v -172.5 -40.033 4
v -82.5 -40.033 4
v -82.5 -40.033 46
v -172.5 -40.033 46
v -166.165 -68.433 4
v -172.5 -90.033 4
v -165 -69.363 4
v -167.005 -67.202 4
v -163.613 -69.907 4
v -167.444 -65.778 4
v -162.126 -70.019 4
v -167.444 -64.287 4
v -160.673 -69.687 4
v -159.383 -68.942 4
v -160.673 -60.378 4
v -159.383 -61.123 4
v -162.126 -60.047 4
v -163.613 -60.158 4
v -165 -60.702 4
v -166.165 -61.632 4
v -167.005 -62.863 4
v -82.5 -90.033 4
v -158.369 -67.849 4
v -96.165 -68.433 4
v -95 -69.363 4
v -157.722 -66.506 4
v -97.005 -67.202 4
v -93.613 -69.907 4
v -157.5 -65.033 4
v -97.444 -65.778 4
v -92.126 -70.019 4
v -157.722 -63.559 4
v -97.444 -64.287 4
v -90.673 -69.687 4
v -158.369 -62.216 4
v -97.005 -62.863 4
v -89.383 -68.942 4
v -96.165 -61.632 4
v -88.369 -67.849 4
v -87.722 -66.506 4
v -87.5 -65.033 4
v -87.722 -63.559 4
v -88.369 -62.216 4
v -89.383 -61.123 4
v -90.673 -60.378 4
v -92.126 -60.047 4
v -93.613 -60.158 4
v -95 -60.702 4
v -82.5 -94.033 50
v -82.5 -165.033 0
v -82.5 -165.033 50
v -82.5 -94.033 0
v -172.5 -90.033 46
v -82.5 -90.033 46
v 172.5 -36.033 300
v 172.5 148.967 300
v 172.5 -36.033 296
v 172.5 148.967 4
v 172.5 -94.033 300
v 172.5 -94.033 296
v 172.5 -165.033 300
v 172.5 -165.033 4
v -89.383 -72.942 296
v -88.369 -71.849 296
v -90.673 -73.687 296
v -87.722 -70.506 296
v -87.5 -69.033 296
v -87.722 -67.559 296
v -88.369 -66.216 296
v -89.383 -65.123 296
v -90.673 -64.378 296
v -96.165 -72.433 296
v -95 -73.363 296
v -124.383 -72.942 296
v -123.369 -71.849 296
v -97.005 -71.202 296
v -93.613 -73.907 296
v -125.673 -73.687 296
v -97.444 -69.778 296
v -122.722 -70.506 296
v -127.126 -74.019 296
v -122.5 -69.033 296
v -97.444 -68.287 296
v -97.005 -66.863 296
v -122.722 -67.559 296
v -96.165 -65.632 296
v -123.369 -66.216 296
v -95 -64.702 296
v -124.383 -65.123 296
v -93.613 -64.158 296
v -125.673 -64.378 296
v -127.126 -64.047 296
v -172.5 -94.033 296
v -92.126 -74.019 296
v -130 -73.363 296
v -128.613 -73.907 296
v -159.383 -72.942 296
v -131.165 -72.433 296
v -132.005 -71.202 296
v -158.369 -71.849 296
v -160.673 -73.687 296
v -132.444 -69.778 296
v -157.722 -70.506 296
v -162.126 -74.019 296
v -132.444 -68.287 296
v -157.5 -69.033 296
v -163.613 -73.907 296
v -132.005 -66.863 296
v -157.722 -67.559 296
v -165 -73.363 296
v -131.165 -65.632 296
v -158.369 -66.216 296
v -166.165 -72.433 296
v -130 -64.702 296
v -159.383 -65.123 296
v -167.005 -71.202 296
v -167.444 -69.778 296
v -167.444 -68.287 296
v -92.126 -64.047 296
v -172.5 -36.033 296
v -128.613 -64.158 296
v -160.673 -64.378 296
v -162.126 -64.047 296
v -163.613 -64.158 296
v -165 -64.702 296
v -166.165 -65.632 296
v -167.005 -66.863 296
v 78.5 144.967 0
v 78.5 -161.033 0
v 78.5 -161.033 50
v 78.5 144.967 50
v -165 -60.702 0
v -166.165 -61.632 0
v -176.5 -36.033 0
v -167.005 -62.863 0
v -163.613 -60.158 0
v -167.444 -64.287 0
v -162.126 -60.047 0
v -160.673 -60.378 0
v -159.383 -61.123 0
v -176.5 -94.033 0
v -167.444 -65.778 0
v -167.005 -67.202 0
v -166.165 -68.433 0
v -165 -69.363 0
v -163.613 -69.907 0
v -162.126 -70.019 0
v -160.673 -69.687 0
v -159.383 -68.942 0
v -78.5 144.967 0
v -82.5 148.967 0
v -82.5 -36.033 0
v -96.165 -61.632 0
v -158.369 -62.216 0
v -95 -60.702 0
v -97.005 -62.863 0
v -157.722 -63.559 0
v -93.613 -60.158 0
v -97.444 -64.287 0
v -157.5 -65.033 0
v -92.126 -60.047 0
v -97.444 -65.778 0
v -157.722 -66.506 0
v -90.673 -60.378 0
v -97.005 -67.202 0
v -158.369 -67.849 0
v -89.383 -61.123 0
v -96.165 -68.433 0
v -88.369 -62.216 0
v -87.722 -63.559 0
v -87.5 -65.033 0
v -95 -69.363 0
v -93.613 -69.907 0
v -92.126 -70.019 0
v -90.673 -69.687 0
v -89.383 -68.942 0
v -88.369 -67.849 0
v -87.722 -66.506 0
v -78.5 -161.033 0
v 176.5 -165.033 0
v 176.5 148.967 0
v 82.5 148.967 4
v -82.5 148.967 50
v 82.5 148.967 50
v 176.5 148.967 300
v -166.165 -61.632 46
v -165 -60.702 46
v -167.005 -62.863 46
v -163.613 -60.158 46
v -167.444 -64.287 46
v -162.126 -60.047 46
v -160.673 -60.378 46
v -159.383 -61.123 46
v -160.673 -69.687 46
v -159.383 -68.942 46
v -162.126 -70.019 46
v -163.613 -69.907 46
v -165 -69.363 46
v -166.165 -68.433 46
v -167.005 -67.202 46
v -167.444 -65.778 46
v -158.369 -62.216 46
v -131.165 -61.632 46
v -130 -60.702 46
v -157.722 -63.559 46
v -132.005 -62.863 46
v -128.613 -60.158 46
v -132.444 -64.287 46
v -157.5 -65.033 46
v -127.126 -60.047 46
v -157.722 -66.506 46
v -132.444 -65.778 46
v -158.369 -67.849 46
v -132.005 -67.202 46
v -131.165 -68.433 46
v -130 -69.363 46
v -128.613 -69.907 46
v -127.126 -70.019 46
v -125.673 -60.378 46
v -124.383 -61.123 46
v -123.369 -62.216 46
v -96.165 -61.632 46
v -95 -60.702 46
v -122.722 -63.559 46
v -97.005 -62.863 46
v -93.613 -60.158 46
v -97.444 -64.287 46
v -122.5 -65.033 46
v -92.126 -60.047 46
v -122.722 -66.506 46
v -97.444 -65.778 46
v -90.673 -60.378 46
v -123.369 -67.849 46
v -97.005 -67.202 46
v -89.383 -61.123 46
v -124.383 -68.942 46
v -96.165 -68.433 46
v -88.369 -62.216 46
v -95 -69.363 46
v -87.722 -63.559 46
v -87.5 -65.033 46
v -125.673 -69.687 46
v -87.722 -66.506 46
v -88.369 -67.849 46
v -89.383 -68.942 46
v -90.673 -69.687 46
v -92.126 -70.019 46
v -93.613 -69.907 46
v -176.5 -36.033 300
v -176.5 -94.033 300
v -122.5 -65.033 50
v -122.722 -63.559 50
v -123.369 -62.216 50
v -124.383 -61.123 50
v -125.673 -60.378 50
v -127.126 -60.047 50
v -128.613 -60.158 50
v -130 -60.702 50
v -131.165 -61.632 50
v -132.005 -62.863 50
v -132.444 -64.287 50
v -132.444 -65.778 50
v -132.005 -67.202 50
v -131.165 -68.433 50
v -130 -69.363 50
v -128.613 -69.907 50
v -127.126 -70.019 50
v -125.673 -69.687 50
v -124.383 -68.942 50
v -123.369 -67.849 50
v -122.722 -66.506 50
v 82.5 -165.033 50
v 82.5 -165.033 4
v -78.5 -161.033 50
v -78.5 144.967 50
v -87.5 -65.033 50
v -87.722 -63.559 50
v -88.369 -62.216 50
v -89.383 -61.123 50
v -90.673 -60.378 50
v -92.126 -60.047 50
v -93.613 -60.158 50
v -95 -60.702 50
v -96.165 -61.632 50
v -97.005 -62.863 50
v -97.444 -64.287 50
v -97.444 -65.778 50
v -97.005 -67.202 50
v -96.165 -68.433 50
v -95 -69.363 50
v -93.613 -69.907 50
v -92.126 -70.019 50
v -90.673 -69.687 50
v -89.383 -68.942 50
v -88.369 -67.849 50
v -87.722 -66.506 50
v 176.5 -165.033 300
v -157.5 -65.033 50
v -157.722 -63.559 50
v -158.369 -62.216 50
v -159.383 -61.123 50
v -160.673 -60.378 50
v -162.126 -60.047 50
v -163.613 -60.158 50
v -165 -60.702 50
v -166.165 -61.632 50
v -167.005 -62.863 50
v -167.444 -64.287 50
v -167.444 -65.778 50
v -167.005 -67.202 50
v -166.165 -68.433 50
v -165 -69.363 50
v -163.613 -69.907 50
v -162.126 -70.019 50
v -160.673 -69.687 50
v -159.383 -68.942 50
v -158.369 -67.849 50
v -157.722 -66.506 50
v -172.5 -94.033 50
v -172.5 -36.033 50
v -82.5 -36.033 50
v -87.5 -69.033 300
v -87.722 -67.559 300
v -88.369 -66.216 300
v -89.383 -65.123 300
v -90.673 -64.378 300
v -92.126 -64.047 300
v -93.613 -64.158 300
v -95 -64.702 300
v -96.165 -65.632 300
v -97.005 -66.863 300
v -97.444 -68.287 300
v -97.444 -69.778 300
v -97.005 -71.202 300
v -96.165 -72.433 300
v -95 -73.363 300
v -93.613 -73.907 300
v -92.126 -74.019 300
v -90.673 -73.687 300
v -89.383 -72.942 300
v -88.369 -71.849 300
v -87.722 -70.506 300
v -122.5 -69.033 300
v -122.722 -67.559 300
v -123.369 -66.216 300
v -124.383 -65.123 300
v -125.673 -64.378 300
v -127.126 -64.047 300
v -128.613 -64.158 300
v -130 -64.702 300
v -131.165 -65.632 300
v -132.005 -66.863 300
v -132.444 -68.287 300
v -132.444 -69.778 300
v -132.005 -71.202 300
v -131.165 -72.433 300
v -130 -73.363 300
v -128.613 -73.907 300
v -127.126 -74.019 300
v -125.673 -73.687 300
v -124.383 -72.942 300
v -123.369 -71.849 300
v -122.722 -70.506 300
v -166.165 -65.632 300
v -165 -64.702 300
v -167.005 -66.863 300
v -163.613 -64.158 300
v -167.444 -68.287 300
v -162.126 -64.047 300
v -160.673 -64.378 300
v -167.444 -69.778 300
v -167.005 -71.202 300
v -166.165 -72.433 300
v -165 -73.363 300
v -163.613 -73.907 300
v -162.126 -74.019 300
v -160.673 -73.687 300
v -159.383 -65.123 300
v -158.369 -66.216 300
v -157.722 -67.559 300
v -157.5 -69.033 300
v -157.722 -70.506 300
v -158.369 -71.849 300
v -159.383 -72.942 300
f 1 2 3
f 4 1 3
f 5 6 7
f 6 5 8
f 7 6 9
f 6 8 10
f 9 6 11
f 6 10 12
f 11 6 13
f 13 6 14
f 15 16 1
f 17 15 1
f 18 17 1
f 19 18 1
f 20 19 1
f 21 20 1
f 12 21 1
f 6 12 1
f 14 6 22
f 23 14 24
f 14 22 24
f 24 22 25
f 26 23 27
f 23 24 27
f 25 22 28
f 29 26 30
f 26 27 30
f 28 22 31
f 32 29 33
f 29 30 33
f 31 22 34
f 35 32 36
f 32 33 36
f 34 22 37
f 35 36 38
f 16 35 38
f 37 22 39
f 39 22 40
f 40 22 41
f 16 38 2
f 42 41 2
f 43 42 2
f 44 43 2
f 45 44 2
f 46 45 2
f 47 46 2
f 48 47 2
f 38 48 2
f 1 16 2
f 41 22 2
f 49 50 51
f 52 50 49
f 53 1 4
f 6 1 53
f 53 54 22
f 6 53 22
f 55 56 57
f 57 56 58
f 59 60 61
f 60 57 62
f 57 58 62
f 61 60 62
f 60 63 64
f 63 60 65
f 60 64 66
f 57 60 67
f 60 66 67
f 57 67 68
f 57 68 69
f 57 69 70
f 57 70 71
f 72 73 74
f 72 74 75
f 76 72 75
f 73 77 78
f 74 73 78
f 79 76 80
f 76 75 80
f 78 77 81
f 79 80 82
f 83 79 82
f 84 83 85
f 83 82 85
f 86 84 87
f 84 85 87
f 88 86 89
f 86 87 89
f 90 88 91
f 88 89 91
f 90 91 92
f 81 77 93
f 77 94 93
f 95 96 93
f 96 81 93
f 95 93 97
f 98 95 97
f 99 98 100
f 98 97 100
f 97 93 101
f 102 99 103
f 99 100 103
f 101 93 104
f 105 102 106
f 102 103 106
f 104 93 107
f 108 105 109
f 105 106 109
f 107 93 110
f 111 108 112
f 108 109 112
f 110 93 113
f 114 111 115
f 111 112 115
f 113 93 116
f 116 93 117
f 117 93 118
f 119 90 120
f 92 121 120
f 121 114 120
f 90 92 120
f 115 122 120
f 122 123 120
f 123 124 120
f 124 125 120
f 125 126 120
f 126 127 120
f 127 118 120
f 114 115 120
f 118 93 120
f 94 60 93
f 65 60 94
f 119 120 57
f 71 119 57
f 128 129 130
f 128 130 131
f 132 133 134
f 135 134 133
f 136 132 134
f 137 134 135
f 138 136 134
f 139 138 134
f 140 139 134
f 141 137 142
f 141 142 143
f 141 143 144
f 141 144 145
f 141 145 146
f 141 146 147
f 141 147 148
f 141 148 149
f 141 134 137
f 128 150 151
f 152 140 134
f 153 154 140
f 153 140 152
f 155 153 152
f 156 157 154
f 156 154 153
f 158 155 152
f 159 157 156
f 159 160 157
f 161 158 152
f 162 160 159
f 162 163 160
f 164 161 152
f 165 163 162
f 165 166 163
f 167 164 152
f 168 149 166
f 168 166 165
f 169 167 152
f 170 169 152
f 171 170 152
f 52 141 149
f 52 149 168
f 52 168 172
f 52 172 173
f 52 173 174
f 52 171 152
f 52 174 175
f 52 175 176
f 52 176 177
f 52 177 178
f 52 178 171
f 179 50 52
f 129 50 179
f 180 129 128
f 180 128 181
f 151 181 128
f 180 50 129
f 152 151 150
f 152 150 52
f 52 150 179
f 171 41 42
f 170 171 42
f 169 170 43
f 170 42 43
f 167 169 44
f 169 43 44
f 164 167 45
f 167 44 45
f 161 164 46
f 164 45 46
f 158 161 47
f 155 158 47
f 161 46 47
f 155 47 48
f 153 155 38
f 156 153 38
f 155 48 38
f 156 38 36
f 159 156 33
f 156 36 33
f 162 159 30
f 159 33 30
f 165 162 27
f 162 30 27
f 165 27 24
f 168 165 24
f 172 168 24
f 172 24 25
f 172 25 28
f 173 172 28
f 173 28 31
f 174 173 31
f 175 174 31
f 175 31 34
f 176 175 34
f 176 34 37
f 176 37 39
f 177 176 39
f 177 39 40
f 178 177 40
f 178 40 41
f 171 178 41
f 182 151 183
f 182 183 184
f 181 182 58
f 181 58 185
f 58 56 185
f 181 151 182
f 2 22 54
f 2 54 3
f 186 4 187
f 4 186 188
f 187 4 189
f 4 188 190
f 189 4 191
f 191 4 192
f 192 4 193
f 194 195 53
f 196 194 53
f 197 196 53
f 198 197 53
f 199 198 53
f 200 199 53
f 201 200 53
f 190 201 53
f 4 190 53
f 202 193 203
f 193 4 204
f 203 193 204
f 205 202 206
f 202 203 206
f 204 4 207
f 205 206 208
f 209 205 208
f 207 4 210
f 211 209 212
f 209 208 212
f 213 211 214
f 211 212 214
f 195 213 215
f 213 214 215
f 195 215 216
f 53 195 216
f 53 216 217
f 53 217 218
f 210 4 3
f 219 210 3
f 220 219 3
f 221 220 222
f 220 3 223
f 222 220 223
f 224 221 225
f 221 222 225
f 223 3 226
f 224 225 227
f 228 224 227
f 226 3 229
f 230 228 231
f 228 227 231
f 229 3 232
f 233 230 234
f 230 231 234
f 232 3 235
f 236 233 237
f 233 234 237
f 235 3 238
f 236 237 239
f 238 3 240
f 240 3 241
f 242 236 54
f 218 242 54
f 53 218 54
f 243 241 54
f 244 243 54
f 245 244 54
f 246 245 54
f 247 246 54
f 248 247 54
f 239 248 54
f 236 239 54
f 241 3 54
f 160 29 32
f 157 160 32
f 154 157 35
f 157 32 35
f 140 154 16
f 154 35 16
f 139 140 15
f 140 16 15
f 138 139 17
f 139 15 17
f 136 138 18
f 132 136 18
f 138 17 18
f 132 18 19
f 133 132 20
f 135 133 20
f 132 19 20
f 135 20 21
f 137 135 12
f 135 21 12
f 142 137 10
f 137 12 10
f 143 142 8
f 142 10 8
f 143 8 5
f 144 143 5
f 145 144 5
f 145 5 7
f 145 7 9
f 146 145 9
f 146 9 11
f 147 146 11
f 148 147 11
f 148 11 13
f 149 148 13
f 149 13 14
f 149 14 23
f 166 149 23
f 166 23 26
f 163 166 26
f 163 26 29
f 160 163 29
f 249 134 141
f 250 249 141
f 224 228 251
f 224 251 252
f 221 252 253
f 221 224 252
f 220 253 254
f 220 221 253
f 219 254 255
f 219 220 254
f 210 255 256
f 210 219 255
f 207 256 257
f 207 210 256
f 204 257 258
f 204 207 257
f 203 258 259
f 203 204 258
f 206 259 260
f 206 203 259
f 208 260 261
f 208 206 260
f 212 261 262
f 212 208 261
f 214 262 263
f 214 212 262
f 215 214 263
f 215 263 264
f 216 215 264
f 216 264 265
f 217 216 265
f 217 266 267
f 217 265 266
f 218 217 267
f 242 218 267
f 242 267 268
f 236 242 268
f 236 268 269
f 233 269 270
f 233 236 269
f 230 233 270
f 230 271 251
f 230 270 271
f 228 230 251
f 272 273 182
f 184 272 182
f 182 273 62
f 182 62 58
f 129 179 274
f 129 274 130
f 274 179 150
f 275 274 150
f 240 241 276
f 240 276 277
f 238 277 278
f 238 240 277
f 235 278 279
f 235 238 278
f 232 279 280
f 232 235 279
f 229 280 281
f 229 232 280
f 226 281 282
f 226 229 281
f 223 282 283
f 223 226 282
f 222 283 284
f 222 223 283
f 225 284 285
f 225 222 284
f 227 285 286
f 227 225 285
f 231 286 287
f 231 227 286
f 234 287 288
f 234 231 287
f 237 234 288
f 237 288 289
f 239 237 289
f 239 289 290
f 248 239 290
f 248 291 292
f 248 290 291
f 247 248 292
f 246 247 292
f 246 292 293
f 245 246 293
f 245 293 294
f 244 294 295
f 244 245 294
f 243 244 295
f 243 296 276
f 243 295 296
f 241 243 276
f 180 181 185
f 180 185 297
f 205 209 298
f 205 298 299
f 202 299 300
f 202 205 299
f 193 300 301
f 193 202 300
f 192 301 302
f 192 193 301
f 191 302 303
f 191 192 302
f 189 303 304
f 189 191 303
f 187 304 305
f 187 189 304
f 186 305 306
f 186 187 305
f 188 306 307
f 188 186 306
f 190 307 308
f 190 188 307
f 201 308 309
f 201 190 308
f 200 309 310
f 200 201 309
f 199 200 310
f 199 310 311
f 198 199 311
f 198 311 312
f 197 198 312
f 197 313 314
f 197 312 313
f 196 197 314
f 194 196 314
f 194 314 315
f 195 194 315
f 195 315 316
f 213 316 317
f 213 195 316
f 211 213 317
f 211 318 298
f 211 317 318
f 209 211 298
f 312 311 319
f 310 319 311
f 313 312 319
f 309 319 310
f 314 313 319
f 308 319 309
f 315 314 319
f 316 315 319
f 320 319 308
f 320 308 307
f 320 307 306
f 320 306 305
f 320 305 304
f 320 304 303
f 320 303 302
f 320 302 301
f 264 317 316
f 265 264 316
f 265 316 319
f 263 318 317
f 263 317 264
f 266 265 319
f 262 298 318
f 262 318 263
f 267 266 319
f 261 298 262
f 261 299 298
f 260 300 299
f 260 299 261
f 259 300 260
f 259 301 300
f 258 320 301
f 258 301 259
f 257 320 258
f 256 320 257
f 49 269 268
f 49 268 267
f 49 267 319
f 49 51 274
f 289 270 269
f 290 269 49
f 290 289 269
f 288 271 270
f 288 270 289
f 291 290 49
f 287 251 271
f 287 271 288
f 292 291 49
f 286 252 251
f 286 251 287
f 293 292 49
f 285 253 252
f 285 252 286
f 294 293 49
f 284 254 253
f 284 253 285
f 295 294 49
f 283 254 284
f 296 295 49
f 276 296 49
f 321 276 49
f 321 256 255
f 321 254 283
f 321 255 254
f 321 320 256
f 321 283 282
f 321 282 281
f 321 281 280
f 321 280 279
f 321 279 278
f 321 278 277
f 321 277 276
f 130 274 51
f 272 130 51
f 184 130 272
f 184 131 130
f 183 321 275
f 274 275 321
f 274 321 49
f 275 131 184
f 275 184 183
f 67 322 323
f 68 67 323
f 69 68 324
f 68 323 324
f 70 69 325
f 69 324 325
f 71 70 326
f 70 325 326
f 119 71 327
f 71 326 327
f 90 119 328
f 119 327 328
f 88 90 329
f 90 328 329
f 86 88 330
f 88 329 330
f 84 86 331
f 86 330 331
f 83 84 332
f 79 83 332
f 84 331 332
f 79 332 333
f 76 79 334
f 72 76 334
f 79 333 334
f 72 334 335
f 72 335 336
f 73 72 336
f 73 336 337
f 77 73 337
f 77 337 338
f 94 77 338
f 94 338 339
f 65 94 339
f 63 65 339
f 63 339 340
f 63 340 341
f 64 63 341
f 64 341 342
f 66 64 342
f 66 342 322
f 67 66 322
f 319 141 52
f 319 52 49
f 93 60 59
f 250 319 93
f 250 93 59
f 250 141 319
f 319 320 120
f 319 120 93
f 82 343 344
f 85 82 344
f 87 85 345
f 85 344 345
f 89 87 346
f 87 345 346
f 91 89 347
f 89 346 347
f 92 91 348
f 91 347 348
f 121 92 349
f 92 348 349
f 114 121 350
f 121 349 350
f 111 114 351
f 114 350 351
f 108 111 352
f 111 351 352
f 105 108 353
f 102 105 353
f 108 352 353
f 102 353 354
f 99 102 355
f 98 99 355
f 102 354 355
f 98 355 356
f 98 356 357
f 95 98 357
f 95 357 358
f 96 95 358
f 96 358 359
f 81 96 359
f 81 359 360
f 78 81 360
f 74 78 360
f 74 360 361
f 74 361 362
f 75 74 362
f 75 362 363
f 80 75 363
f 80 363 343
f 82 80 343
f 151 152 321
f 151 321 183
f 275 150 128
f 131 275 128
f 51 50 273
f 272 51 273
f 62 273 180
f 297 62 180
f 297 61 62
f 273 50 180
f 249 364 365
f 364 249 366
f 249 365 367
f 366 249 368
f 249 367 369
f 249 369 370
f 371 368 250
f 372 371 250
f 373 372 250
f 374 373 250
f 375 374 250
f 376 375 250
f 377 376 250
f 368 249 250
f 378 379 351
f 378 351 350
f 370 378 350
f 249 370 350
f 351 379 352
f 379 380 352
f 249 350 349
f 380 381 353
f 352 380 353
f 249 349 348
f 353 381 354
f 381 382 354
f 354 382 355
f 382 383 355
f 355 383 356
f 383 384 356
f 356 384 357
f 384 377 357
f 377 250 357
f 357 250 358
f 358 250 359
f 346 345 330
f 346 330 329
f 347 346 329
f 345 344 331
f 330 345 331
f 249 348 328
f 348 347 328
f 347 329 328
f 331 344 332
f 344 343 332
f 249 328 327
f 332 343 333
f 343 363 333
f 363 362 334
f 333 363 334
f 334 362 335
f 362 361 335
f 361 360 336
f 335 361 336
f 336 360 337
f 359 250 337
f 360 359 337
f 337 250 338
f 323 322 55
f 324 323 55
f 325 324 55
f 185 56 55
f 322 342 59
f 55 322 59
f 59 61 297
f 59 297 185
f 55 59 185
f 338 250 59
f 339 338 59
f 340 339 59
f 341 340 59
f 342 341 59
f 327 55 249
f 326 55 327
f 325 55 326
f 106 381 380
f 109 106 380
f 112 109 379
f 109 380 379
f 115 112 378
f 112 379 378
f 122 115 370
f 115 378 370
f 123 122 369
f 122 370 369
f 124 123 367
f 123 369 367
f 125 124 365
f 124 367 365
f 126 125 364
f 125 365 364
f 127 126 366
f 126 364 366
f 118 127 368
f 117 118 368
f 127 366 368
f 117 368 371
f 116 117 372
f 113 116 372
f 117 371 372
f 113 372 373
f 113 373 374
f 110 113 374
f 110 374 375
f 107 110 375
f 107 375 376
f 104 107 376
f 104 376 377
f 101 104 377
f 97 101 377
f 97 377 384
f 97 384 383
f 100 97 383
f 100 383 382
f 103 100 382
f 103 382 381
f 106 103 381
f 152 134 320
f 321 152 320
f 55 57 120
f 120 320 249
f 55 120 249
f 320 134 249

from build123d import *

# Parameters (mm, degrees)
F0_W          = 165
F0_H          = 314
F0_W_2        = 157
F0_H_2        = 306
F1_DEPTH      = 50
F3_DEPTH      = 90
F4_R          = 5
F5_DEPTH      = 14
F5_DEPTH_BACK = 70
F6_DEPTH      = 50
F7_W          = 4
F7_H          = 58
F8_DEPTH      = 300
F9_W          = 58
F9_H          = 4
F10_DEPTH     = 345
F11_W         = 314
F11_H         = 4
F12_DEPTH     = 90
F13_W         = 4
F13_H         = 314
F14_DEPTH     = 300
F15_R         = 5
F16_DEPTH     = 29


# Not quite as in the source:
# - a feature names something its author has since deleted; it is built from what else it names


with BuildPart() as f1:
    # F0 (on Top) → F1 (new body)
    with BuildSketch(Plane.XY):
        with Locations((0, -8.0325696617)):
            Rectangle(F0_W, F0_H)
        with Locations((0, -8.0325696617)):
            Rectangle(F0_W_2, F0_H_2, mode=Mode.SUBTRACT)
    extrude(amount=F1_DEPTH)

    # F2 (on face) → F3 (join)
    with BuildSketch(Plane(origin=(-82.5, 0, 0), x_dir=(0, -1, 0), z_dir=(-1, 0, 0))):
        Polygon((36.0325696617, 0), (65.0325696617, 0), (65.0325696617, 4), (40.0325696617, 4), (40.0325696617, 46), (65.0325696617, 46), (65.0325696617, 50), (36.0325696617, 50), align=None)
        Polygon((65.0325696617, 4), (65.0325696617, 0), (94.0325696617, 0), (94.0325696617, 50), (65.0325696617, 50), (65.0325696617, 46), (90.0325696617, 46), (90.0325696617, 4), align=None)
    extrude(amount=F3_DEPTH)

    # F4 (on face) → F5 (cut, two sides)
    with BuildSketch(Plane.XY.offset(4)) as f5_sk:
        with Locations((-92.5, -65.0325696617)):
            Circle(F4_R)
        with Locations((-162.5, -65.0325696617)):
            Circle(F4_R)
    extrude(amount=-F5_DEPTH, mode=Mode.SUBTRACT)
    extrude(f5_sk.sketch, amount=F5_DEPTH_BACK, mode=Mode.SUBTRACT)

    # F4 (on face) → F6 (cut)
    with BuildSketch(Plane.XY.offset(4)):
        with Locations((-127.5, -65.0325696617)):
            Circle(F4_R)
    extrude(amount=F6_DEPTH, mode=Mode.SUBTRACT)

    # F7 (on face) → F8 (join)
    with BuildSketch(Plane(origin=(0, 0, 0), x_dir=(1, 0, 0), z_dir=(0, 0, -1))):
        with Locations((-174.5, 65.0325696617)):
            Rectangle(F7_W, F7_H)
    extrude(amount=-F8_DEPTH)

    # F9 (on face) → F10 (join)
    with BuildSketch(Plane.YZ.offset(-172.5)):
        with Locations((-65.0325696617, 298)):
            Rectangle(F9_W, F9_H)
    extrude(amount=F10_DEPTH)

    # F11 (on face) → F12 (join)
    with BuildSketch(Plane.YZ.offset(82.5)):
        with Locations((-8.0325696617, 2)):
            Rectangle(F11_W, F11_H)
    extrude(amount=F12_DEPTH)

    # F13 (on face) → F14 (join)
    with BuildSketch(Plane(origin=(0, 0, 0), x_dir=(1, 0, 0), z_dir=(0, 0, -1))):
        with Locations((174.5, 8.0325696617)):
            Rectangle(F13_W, F13_H)
    extrude(amount=-F14_DEPTH)

    # F15 (on face) → F16 (cut)
    with BuildSketch(Plane.XY.offset(300)):
        with Locations((-92.5, -69.0325696617)):
            Circle(F15_R)
        with Locations((-127.5, -69.0325696617)):
            Circle(F15_R)
        with Locations((-162.5, -69.0325696617)):
            Circle(F15_R)
    extrude(amount=-F16_DEPTH, mode=Mode.SUBTRACT)


solid = f1.part
